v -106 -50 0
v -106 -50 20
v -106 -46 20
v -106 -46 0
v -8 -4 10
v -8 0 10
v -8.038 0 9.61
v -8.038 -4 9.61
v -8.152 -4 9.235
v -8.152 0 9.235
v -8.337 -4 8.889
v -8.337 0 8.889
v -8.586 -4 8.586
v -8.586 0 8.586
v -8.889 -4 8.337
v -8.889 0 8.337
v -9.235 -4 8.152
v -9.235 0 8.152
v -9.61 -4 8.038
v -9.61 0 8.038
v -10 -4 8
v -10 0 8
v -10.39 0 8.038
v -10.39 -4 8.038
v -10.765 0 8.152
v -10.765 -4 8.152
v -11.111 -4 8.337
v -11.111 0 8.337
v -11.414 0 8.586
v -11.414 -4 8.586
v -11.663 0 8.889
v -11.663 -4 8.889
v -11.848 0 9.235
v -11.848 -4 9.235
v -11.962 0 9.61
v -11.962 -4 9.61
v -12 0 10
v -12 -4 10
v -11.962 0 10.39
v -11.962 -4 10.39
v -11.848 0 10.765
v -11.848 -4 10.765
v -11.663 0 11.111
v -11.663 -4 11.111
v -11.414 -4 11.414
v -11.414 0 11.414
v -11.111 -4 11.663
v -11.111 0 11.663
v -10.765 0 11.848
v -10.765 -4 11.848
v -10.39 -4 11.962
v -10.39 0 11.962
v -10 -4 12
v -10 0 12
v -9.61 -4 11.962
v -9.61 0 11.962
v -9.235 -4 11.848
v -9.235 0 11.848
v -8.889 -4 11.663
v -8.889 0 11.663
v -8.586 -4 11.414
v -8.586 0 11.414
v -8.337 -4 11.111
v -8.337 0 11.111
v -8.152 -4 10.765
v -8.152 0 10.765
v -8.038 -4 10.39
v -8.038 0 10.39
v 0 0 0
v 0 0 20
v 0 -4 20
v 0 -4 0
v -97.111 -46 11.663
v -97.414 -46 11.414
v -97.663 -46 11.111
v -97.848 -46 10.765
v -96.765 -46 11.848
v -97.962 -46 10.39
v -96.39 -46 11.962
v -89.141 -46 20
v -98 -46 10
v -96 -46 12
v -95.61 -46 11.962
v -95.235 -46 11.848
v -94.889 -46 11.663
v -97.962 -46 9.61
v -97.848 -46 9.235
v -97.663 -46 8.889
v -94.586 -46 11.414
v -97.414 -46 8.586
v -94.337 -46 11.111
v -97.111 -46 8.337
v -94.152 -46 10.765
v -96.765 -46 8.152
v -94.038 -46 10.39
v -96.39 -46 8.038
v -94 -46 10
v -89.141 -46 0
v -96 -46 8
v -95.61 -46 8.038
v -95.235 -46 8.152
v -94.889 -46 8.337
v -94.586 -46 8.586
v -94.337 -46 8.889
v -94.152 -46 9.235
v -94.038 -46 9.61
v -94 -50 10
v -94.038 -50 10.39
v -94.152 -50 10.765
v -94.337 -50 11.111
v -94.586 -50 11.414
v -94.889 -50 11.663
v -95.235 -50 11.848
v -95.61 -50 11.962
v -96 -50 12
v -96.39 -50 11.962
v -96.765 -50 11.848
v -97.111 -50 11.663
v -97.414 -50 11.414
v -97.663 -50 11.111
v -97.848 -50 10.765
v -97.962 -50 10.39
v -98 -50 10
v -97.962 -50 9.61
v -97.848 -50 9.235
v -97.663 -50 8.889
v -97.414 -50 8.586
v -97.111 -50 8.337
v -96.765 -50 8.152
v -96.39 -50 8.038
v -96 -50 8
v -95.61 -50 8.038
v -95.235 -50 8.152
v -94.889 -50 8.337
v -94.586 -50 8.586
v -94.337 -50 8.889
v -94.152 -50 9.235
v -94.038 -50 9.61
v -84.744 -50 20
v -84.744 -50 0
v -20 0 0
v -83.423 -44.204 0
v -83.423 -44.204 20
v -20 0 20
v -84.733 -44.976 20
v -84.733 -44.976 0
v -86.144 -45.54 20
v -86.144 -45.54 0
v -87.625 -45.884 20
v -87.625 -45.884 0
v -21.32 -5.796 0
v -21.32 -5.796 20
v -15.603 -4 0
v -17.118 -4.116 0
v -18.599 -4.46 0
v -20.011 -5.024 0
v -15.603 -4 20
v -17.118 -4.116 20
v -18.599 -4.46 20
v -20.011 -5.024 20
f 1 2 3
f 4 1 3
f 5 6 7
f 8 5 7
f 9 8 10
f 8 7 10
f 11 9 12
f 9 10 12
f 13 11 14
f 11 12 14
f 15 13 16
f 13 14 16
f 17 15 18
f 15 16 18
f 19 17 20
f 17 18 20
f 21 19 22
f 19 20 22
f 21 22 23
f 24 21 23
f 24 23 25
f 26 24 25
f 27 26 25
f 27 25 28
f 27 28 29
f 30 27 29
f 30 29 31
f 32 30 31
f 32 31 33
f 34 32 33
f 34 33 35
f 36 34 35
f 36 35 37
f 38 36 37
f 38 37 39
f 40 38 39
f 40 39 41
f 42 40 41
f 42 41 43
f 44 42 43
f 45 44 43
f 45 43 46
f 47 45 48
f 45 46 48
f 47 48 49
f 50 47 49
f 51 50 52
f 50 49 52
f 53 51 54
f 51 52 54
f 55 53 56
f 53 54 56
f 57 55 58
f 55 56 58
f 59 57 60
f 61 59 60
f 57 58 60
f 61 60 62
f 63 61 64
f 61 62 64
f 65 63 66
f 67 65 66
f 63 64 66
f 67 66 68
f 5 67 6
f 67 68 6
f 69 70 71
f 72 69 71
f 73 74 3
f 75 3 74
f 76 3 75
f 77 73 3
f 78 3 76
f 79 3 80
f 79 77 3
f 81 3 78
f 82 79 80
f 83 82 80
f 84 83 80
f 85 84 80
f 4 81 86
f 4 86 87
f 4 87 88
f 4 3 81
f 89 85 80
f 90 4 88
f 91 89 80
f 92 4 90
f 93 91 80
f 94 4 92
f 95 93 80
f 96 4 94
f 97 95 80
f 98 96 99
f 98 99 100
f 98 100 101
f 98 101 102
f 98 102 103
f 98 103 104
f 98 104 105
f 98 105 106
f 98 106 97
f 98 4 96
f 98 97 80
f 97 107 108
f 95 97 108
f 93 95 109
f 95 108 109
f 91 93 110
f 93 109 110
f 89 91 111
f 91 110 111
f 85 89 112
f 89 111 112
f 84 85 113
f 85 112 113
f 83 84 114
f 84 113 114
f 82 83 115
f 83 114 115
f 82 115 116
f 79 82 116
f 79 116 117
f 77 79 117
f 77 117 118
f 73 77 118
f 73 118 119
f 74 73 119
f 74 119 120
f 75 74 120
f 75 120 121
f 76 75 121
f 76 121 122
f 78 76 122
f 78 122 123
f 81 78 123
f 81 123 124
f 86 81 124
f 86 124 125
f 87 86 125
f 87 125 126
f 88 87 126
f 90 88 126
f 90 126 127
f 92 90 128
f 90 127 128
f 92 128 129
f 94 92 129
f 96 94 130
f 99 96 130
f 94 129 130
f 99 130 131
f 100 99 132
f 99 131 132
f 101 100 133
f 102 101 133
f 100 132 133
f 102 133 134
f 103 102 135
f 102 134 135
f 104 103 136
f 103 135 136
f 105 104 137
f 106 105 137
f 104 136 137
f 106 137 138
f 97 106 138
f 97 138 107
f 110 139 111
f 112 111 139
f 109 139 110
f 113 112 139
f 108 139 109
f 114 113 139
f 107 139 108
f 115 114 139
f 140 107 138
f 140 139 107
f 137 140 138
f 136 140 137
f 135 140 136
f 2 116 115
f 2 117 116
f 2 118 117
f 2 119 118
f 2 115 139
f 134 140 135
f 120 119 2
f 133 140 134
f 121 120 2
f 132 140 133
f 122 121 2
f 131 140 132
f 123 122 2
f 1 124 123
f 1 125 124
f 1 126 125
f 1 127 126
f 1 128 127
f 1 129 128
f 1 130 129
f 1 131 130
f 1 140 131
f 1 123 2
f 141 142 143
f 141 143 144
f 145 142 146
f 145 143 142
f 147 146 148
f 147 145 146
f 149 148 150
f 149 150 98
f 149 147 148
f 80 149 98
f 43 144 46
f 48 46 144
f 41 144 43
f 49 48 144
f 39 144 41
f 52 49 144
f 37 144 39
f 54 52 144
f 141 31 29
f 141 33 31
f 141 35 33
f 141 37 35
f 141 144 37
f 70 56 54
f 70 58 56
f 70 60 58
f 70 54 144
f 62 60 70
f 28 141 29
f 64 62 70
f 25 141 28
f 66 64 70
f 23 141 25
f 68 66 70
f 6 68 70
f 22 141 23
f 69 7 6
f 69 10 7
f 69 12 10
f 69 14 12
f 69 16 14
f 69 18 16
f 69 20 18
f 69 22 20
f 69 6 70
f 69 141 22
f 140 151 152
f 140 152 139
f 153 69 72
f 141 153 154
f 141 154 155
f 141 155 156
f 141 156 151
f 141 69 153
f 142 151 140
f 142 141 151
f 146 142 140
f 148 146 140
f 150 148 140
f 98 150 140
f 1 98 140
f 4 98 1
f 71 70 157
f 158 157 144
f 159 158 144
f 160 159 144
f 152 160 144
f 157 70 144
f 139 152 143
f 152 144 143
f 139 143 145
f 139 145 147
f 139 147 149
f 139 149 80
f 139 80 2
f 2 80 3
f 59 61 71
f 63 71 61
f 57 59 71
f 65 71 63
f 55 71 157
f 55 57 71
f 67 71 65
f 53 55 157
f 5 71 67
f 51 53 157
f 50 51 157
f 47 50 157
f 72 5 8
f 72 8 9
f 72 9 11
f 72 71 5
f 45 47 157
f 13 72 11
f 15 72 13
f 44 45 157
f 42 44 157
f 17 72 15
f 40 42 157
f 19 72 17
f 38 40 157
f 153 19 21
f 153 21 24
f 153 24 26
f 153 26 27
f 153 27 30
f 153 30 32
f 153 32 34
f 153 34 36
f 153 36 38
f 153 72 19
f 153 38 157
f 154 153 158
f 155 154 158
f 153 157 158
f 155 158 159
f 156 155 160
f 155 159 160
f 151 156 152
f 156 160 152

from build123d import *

# Parameters (mm, degrees)
EXTRUDE_1_DEPTH     = 20
SKETCH_13_R         = 2
CUT_EXTRUDE_7_DEPTH = 51
SKETCH_16_R         = 2
CUT_EXTRUDE_8_DEPTH = 51
FILLET_2_R          = 10


with BuildPart() as part:
    # 草图2 → 凸台-拉伸1 (new body)
    with BuildSketch(Plane.XY):
        Polygon((0, 0), (0, -4), (-18.7435877, -4), (-84.7435877, -50), (-106, -50), (-106, -46), (-86, -46), (-20, 0), align=None)
    extrude(amount=EXTRUDE_1_DEPTH)

    # 草图13 → 切除-拉伸7 (cut, through all)
    with BuildSketch(Plane(origin=(0, 0, 0), x_dir=(1, 0, 0), z_dir=(0, 1, 0))):
        with Locations((-10, -10)):
            Circle(SKETCH_13_R)
    extrude(amount=-CUT_EXTRUDE_7_DEPTH, mode=Mode.SUBTRACT)

    # 草图16 → 切除-拉伸8 (cut, through all)
    with BuildSketch(Plane.XZ.offset(50)):
        with Locations((-96, 10)):
            Circle(SKETCH_16_R)
    extrude(amount=-CUT_EXTRUDE_8_DEPTH, mode=Mode.SUBTRACT)

    # 圆角2
    fillet_2_edges = [part.edges().sort_by_distance(p)[0] for p in [
        (-18.7435877, -4, 10),
        (-86, -46, 10),
    ]]
    fillet(fillet_2_edges, radius=FILLET_2_R)


solid = part.part
